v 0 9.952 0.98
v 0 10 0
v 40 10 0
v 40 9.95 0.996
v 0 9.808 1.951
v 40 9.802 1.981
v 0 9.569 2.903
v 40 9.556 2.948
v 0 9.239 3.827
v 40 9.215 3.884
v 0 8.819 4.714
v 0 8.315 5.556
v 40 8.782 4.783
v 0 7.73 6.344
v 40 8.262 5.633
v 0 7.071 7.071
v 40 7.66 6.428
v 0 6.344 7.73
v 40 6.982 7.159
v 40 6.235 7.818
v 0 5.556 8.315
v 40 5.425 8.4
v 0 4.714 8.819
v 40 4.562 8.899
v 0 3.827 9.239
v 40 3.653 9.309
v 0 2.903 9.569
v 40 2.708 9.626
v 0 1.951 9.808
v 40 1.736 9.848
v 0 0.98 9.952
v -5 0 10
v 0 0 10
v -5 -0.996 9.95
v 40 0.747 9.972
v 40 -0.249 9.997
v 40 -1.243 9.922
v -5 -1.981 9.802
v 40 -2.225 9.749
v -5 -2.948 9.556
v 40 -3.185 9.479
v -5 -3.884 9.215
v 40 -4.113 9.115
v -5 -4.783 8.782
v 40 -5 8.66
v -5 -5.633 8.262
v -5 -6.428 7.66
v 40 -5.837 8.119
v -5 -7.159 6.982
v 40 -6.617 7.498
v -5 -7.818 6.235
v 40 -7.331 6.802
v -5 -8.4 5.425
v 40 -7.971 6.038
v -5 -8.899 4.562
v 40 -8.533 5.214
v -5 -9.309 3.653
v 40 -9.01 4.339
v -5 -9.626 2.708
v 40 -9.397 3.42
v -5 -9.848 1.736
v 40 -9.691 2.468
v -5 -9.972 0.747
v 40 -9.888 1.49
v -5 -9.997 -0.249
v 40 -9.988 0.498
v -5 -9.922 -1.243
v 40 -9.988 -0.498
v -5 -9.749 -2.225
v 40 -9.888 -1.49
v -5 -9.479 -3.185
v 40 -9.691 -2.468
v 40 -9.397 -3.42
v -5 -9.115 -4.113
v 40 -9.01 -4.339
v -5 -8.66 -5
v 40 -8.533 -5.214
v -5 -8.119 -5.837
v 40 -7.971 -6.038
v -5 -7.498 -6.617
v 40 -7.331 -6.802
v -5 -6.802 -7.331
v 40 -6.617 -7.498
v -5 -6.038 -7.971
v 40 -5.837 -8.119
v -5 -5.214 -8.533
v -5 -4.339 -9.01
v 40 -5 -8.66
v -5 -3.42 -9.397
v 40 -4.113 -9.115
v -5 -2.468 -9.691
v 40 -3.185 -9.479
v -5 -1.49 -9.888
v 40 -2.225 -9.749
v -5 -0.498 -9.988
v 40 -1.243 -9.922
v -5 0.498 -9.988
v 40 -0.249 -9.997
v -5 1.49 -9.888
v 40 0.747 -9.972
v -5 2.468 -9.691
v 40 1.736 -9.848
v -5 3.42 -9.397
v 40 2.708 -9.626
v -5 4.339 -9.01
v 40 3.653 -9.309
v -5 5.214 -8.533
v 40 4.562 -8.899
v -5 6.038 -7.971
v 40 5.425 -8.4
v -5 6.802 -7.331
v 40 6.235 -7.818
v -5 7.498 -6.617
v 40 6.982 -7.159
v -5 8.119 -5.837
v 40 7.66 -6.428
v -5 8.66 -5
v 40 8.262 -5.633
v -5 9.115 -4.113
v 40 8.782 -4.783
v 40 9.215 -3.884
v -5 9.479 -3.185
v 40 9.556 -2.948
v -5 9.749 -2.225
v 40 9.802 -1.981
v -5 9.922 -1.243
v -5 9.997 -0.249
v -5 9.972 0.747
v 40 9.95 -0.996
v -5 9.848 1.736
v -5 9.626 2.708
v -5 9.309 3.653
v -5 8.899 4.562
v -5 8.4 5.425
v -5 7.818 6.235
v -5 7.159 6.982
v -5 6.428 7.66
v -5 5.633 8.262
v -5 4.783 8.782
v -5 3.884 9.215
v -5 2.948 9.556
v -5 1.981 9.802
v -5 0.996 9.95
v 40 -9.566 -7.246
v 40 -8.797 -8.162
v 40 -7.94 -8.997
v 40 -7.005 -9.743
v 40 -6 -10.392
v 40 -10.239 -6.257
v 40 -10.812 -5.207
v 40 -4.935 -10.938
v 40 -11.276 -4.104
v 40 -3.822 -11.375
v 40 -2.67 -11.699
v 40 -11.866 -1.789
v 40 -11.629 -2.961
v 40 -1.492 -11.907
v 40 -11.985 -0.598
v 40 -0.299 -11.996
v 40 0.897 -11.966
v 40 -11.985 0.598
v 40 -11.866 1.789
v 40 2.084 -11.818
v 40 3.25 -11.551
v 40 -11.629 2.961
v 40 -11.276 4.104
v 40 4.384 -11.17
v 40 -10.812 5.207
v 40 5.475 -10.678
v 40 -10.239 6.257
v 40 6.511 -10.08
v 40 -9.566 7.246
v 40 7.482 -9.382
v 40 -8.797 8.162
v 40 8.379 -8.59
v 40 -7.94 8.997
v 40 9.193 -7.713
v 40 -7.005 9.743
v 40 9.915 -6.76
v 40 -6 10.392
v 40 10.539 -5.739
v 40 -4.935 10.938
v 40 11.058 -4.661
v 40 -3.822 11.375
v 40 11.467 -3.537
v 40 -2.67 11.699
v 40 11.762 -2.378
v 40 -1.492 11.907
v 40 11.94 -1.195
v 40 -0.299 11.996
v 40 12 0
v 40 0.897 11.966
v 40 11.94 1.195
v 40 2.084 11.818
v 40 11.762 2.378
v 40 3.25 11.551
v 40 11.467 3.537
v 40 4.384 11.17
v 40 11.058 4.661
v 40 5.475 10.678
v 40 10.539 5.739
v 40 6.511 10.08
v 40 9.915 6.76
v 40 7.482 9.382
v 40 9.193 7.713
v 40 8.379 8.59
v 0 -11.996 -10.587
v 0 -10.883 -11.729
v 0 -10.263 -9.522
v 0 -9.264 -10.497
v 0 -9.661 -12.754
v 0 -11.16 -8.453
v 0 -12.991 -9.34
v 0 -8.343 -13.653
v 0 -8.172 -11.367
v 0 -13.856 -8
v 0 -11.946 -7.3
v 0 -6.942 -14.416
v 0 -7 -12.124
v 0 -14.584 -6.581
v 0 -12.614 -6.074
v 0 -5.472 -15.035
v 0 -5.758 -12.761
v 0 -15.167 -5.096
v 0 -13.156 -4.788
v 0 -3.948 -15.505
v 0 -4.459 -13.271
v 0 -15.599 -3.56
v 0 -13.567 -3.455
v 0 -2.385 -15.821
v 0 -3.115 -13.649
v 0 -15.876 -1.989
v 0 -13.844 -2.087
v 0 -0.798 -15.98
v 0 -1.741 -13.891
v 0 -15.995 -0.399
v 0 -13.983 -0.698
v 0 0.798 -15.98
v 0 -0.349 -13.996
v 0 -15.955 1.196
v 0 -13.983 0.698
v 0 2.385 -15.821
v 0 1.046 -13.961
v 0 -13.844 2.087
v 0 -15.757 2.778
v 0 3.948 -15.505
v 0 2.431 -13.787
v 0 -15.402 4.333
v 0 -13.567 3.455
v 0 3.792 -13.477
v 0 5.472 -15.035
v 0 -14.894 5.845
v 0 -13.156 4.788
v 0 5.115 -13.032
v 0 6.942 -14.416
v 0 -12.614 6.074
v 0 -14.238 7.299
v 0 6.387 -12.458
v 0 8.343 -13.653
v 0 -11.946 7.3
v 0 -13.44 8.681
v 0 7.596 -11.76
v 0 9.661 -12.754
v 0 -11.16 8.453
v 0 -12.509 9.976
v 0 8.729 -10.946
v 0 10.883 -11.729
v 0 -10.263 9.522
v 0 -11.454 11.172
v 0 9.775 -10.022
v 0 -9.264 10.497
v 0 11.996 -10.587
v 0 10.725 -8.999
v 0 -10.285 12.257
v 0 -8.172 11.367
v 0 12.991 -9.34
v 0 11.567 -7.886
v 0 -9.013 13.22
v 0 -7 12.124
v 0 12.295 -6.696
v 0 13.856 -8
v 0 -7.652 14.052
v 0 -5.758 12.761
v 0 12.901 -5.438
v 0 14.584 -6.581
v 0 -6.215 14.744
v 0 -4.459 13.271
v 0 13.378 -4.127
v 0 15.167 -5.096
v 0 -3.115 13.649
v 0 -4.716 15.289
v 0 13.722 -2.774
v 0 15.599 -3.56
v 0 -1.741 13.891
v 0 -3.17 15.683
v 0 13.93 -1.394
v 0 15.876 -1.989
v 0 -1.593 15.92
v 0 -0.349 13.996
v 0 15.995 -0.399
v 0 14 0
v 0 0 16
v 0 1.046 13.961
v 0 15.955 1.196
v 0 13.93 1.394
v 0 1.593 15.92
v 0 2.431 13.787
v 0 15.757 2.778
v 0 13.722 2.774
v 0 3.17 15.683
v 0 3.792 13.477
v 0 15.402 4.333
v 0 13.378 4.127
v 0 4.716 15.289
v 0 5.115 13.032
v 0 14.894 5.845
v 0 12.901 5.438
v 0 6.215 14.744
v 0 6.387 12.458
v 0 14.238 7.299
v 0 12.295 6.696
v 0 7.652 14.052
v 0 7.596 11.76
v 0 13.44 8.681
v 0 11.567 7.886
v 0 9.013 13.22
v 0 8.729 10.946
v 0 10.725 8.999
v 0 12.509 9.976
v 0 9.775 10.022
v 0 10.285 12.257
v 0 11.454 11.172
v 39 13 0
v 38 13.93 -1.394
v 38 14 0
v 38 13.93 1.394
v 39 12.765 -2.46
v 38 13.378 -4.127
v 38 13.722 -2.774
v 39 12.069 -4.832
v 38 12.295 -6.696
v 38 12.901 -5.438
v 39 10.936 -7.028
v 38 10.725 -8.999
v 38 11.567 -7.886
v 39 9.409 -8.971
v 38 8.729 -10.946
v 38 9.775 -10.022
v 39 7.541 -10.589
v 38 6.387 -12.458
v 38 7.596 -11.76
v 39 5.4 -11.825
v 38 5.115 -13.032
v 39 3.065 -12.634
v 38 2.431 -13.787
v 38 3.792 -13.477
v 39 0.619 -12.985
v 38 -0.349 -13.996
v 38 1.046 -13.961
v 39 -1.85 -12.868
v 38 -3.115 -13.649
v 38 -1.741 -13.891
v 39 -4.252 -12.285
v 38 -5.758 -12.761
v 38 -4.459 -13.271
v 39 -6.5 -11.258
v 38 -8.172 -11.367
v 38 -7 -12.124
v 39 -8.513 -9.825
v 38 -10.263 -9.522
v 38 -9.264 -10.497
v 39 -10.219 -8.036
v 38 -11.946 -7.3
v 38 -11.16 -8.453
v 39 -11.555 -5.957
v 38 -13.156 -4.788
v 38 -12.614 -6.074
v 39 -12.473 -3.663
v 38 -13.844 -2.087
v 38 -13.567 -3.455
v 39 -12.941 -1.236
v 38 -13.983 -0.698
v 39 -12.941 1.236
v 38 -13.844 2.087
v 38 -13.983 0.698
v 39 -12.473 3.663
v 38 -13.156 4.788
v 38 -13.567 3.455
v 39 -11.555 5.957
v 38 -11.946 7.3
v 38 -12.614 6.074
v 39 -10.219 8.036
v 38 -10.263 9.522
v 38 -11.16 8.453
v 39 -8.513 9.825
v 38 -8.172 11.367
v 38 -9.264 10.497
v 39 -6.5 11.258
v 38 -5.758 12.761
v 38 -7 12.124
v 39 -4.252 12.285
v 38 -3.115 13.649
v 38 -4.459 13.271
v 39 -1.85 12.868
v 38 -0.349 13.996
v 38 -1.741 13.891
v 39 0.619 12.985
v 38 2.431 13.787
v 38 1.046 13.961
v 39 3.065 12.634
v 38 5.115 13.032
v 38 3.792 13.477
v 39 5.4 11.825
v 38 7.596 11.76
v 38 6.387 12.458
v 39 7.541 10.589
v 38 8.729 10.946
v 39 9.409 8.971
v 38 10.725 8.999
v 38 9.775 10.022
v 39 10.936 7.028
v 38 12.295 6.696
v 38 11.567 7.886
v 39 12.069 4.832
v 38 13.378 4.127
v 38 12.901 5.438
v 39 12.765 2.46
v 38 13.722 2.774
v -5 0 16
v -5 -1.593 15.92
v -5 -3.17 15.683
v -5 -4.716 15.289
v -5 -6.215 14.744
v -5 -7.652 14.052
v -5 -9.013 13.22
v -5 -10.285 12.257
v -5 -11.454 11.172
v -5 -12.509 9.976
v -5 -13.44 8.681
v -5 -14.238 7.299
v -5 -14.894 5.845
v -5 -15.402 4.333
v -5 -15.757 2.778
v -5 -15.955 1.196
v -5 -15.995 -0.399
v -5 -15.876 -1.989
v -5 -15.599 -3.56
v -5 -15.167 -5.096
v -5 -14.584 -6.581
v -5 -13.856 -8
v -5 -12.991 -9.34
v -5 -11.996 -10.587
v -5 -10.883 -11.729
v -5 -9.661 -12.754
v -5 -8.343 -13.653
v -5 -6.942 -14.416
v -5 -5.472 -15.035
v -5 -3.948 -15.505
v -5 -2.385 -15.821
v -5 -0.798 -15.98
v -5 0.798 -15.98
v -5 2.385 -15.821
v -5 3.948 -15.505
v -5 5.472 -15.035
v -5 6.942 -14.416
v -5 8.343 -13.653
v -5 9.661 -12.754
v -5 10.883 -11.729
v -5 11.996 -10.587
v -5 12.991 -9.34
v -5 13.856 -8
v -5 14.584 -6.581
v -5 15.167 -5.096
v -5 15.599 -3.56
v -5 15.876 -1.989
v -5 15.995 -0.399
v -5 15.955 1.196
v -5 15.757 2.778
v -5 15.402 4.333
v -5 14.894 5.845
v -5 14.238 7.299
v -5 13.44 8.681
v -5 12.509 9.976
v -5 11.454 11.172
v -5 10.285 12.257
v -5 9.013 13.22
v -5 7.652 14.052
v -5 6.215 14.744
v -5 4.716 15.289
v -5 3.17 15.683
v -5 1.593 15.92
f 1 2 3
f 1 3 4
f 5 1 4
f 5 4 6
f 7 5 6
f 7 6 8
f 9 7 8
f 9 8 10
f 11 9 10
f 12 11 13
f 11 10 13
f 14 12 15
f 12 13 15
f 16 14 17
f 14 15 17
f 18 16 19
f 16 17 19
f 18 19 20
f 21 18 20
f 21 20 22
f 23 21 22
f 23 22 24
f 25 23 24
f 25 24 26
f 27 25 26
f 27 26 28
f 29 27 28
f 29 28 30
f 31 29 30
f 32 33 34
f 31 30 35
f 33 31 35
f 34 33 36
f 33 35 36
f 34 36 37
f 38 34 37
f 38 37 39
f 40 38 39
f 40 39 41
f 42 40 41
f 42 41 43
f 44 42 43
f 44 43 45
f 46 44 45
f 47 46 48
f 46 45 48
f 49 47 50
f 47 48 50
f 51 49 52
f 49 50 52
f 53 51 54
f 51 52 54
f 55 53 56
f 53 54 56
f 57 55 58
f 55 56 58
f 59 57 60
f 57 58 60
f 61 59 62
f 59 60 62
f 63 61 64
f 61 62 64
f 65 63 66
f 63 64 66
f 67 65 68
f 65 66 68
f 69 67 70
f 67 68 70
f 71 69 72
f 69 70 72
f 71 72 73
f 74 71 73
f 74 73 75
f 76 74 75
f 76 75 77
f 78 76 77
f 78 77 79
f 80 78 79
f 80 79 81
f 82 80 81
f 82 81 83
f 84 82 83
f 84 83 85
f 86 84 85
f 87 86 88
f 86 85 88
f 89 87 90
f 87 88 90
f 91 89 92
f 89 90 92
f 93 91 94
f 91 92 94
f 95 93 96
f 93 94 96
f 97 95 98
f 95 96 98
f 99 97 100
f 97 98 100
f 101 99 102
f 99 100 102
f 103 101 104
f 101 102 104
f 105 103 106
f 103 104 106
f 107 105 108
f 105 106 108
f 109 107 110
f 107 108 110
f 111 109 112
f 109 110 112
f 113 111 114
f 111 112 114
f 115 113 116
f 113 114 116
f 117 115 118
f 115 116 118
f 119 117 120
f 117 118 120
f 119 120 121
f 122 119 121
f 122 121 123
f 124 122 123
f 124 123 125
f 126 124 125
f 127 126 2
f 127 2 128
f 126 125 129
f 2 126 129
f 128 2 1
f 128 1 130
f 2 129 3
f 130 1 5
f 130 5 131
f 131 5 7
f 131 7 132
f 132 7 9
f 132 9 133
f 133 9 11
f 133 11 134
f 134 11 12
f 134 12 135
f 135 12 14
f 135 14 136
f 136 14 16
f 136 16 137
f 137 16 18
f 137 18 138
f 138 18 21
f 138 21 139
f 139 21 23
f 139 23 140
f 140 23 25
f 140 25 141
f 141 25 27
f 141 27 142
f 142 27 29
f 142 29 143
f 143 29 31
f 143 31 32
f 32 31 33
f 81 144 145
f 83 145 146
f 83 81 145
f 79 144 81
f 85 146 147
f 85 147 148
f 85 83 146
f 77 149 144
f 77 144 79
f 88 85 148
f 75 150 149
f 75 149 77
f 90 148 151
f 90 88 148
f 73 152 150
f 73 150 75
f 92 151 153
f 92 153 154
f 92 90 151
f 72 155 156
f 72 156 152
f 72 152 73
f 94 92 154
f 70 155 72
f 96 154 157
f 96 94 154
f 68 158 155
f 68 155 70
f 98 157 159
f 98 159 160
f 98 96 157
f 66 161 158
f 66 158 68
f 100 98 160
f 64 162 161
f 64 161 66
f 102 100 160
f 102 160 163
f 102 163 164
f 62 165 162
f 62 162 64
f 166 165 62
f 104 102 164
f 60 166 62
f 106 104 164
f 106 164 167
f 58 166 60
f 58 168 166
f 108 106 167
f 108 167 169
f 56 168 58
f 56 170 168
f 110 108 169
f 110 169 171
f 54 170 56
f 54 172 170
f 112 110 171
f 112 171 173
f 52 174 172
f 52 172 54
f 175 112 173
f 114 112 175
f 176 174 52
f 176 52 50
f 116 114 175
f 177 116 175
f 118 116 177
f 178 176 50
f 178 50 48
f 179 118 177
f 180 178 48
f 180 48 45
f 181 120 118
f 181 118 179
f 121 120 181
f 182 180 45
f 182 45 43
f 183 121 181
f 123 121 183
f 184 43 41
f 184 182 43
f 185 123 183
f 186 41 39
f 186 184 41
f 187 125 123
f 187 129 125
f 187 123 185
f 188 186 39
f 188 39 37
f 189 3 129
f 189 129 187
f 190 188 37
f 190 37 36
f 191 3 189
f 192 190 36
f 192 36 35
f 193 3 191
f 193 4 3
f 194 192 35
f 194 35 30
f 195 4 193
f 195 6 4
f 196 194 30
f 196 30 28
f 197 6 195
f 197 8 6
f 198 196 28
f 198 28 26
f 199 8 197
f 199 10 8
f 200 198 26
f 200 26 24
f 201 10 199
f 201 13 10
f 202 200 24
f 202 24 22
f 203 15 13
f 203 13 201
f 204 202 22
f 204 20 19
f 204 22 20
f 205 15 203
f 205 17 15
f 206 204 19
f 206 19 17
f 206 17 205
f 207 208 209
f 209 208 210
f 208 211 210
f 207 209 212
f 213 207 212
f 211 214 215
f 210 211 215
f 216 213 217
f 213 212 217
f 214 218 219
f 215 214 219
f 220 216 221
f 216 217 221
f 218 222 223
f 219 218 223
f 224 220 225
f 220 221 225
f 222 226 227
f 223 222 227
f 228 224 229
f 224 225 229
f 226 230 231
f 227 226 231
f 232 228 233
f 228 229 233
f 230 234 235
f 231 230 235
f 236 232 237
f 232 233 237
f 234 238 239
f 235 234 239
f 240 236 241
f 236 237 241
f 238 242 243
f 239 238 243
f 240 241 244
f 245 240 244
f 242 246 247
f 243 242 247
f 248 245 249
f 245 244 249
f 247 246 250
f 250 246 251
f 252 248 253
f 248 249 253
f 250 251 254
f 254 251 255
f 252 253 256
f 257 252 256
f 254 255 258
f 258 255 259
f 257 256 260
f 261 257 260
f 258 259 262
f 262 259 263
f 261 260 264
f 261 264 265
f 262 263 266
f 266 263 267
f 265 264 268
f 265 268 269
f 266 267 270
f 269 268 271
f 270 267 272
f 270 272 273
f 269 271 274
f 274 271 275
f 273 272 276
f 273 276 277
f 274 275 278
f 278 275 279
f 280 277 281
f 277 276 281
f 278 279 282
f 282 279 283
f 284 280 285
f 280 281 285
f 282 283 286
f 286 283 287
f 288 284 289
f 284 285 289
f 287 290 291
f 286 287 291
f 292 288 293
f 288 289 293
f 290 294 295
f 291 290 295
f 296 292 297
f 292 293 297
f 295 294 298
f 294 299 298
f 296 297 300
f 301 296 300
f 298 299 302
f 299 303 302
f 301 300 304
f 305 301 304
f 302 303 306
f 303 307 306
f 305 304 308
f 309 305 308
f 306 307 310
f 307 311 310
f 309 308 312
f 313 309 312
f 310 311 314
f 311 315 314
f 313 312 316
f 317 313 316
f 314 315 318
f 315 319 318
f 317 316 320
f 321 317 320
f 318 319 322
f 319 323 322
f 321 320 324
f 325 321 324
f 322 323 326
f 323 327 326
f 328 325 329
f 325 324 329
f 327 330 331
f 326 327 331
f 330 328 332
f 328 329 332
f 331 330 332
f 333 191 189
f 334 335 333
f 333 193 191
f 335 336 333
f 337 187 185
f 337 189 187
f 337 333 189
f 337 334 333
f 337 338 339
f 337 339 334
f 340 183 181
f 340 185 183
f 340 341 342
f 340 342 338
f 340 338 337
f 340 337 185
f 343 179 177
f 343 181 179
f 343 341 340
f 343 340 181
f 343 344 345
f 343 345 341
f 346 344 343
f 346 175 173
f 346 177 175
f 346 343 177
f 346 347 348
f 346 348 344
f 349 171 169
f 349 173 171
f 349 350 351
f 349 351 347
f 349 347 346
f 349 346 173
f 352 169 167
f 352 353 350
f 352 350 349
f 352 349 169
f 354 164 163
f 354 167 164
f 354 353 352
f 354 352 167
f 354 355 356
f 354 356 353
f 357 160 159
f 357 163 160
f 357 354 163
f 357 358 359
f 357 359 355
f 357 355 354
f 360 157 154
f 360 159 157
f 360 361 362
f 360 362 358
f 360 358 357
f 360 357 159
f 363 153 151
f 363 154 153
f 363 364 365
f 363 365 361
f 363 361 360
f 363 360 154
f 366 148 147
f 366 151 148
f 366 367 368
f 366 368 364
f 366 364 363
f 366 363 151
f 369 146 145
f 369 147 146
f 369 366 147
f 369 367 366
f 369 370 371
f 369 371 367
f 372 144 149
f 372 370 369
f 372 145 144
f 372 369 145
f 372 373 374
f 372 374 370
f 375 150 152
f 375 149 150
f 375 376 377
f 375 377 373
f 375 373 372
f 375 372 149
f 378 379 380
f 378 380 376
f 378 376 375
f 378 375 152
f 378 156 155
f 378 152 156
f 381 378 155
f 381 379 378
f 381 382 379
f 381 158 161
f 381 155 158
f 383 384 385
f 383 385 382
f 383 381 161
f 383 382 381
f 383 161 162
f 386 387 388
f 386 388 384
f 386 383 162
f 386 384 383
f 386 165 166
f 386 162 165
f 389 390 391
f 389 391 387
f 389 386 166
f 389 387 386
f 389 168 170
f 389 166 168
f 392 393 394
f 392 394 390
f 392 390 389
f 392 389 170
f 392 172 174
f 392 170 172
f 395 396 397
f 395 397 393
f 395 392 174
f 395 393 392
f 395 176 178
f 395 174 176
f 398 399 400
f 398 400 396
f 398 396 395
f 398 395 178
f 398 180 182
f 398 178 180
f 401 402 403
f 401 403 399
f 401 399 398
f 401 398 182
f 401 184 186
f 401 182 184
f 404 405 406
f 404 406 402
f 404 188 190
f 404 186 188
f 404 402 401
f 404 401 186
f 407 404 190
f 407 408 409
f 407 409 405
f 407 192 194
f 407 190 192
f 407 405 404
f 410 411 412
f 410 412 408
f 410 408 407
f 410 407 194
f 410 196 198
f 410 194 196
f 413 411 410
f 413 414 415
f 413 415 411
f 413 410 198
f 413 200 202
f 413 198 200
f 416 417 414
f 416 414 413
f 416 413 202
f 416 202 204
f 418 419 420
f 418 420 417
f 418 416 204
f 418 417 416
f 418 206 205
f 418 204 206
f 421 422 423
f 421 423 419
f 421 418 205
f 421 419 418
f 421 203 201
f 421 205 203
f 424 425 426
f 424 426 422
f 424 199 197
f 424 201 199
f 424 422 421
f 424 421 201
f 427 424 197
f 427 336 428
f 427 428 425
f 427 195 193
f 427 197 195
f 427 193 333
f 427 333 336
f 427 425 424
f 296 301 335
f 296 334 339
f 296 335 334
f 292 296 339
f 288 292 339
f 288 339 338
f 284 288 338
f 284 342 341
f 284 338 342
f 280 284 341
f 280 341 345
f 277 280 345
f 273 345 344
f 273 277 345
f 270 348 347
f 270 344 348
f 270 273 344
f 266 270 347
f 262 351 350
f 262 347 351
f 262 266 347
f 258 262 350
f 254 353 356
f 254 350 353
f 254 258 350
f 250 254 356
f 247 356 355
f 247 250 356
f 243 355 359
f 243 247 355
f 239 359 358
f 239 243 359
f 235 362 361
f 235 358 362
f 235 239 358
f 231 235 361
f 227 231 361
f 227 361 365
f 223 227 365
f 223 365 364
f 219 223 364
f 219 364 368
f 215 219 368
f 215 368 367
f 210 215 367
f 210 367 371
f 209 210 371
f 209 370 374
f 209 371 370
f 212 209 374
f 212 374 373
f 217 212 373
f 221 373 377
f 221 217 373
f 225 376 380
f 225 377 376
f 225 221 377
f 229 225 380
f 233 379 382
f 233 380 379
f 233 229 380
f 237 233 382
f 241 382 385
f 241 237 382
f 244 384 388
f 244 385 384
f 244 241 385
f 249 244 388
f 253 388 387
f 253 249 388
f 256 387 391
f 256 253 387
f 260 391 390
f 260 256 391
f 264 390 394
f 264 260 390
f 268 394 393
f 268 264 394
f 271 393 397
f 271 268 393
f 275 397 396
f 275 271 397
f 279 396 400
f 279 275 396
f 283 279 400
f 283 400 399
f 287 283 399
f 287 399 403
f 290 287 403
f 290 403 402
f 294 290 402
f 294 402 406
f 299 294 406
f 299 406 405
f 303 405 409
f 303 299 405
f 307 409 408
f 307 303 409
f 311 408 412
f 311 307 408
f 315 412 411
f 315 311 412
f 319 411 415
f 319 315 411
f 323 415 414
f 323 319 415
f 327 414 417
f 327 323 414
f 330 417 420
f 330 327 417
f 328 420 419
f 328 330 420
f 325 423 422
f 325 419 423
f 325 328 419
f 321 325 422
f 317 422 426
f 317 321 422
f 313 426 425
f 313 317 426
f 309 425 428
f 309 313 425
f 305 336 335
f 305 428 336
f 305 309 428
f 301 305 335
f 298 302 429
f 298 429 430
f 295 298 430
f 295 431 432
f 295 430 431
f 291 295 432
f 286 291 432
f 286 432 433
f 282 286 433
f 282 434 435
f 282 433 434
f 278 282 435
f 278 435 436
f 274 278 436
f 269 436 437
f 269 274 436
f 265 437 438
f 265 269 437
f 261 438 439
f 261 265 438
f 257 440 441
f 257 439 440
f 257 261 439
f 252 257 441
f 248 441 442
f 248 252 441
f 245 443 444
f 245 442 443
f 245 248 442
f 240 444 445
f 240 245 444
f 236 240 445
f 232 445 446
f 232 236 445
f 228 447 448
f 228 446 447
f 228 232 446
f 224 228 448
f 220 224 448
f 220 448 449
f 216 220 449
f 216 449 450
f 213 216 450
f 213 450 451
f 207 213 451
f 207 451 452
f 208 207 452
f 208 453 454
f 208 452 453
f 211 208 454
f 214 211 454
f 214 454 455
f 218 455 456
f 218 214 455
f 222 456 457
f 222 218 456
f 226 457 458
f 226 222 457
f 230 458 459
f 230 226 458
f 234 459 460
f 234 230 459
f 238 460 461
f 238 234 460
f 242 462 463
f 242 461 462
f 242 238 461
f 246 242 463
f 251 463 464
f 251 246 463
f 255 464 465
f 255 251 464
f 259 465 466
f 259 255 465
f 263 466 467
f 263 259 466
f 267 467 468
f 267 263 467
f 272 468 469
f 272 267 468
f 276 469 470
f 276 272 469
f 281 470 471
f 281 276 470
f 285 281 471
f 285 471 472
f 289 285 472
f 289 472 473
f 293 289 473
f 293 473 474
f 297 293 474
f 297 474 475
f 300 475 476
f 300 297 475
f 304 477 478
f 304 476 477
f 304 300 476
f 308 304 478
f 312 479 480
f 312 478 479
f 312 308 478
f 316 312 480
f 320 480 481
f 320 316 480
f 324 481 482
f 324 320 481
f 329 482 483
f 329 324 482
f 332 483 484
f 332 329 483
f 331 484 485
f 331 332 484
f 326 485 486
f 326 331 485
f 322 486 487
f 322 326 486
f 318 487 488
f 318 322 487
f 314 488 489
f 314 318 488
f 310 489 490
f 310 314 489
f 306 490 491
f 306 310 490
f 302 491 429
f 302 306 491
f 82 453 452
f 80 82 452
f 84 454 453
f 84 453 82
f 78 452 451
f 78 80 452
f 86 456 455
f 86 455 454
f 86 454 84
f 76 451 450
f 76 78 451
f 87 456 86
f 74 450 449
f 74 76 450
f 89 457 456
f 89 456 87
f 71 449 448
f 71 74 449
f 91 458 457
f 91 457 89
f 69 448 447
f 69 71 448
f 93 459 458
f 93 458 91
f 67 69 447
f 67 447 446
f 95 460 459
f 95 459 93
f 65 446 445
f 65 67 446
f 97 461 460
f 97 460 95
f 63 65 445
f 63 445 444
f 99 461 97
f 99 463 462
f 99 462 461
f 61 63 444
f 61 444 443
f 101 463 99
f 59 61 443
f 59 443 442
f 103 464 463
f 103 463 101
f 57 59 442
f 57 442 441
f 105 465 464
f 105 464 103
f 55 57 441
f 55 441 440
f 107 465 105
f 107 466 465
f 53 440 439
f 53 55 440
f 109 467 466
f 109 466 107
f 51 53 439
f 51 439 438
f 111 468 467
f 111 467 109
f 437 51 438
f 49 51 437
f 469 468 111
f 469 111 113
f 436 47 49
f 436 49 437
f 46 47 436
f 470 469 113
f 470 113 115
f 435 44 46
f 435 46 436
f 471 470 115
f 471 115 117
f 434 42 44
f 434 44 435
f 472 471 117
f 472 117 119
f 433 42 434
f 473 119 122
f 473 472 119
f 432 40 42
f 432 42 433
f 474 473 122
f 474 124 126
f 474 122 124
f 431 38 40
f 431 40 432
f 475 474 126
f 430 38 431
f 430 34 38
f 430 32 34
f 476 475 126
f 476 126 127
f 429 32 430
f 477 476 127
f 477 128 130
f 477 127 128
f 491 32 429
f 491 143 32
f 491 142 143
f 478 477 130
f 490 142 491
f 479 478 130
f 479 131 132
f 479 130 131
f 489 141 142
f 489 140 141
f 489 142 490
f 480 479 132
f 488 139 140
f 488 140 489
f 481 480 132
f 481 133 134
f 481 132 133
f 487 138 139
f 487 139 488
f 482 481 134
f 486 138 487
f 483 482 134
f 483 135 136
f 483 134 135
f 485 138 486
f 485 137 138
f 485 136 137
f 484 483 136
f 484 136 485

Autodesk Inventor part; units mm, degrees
ref_plane "YZ Plane" through (0, 0, 0) normal (1, 0, 0) x (0, 1, 0)
ref_plane "XZ Plane" through (0, 0, 0) normal (0, 1, 0) x (-1, 0, 0)
ref_plane "XY Plane" through (0, 0, 0) normal (0, 0, 1) x (1, 0, 0)
sketch "Skizze1" plane through (0, 0, 0) normal (1, 0, 0) x (0, 1, 0)
  circle A0 centre (0, 0) radius 14
  circle A1 centre (0, 0) radius 10
  dimension "d0" = 28
  dimension "d1" = 20
extrude "Extrusion1" add sketch "Skizze1" along normal blind 40
chamfer "Fasen1" distance 2 angle 45 1 edges at (40, -14, 0)
sketch "Skizze2" plane through (0, 0, 0) normal (-1, 0, 0) x (0, 0, 1)
  circle A0 centre (0, 0) radius 16
  circle A1 centre (0, 0) radius 10
  dimension "d7" = 32
extrude "Extrusion2" add sketch "Skizze2" along normal blind 5
properties part number "LagerBund" material "Nylon 6/6"
